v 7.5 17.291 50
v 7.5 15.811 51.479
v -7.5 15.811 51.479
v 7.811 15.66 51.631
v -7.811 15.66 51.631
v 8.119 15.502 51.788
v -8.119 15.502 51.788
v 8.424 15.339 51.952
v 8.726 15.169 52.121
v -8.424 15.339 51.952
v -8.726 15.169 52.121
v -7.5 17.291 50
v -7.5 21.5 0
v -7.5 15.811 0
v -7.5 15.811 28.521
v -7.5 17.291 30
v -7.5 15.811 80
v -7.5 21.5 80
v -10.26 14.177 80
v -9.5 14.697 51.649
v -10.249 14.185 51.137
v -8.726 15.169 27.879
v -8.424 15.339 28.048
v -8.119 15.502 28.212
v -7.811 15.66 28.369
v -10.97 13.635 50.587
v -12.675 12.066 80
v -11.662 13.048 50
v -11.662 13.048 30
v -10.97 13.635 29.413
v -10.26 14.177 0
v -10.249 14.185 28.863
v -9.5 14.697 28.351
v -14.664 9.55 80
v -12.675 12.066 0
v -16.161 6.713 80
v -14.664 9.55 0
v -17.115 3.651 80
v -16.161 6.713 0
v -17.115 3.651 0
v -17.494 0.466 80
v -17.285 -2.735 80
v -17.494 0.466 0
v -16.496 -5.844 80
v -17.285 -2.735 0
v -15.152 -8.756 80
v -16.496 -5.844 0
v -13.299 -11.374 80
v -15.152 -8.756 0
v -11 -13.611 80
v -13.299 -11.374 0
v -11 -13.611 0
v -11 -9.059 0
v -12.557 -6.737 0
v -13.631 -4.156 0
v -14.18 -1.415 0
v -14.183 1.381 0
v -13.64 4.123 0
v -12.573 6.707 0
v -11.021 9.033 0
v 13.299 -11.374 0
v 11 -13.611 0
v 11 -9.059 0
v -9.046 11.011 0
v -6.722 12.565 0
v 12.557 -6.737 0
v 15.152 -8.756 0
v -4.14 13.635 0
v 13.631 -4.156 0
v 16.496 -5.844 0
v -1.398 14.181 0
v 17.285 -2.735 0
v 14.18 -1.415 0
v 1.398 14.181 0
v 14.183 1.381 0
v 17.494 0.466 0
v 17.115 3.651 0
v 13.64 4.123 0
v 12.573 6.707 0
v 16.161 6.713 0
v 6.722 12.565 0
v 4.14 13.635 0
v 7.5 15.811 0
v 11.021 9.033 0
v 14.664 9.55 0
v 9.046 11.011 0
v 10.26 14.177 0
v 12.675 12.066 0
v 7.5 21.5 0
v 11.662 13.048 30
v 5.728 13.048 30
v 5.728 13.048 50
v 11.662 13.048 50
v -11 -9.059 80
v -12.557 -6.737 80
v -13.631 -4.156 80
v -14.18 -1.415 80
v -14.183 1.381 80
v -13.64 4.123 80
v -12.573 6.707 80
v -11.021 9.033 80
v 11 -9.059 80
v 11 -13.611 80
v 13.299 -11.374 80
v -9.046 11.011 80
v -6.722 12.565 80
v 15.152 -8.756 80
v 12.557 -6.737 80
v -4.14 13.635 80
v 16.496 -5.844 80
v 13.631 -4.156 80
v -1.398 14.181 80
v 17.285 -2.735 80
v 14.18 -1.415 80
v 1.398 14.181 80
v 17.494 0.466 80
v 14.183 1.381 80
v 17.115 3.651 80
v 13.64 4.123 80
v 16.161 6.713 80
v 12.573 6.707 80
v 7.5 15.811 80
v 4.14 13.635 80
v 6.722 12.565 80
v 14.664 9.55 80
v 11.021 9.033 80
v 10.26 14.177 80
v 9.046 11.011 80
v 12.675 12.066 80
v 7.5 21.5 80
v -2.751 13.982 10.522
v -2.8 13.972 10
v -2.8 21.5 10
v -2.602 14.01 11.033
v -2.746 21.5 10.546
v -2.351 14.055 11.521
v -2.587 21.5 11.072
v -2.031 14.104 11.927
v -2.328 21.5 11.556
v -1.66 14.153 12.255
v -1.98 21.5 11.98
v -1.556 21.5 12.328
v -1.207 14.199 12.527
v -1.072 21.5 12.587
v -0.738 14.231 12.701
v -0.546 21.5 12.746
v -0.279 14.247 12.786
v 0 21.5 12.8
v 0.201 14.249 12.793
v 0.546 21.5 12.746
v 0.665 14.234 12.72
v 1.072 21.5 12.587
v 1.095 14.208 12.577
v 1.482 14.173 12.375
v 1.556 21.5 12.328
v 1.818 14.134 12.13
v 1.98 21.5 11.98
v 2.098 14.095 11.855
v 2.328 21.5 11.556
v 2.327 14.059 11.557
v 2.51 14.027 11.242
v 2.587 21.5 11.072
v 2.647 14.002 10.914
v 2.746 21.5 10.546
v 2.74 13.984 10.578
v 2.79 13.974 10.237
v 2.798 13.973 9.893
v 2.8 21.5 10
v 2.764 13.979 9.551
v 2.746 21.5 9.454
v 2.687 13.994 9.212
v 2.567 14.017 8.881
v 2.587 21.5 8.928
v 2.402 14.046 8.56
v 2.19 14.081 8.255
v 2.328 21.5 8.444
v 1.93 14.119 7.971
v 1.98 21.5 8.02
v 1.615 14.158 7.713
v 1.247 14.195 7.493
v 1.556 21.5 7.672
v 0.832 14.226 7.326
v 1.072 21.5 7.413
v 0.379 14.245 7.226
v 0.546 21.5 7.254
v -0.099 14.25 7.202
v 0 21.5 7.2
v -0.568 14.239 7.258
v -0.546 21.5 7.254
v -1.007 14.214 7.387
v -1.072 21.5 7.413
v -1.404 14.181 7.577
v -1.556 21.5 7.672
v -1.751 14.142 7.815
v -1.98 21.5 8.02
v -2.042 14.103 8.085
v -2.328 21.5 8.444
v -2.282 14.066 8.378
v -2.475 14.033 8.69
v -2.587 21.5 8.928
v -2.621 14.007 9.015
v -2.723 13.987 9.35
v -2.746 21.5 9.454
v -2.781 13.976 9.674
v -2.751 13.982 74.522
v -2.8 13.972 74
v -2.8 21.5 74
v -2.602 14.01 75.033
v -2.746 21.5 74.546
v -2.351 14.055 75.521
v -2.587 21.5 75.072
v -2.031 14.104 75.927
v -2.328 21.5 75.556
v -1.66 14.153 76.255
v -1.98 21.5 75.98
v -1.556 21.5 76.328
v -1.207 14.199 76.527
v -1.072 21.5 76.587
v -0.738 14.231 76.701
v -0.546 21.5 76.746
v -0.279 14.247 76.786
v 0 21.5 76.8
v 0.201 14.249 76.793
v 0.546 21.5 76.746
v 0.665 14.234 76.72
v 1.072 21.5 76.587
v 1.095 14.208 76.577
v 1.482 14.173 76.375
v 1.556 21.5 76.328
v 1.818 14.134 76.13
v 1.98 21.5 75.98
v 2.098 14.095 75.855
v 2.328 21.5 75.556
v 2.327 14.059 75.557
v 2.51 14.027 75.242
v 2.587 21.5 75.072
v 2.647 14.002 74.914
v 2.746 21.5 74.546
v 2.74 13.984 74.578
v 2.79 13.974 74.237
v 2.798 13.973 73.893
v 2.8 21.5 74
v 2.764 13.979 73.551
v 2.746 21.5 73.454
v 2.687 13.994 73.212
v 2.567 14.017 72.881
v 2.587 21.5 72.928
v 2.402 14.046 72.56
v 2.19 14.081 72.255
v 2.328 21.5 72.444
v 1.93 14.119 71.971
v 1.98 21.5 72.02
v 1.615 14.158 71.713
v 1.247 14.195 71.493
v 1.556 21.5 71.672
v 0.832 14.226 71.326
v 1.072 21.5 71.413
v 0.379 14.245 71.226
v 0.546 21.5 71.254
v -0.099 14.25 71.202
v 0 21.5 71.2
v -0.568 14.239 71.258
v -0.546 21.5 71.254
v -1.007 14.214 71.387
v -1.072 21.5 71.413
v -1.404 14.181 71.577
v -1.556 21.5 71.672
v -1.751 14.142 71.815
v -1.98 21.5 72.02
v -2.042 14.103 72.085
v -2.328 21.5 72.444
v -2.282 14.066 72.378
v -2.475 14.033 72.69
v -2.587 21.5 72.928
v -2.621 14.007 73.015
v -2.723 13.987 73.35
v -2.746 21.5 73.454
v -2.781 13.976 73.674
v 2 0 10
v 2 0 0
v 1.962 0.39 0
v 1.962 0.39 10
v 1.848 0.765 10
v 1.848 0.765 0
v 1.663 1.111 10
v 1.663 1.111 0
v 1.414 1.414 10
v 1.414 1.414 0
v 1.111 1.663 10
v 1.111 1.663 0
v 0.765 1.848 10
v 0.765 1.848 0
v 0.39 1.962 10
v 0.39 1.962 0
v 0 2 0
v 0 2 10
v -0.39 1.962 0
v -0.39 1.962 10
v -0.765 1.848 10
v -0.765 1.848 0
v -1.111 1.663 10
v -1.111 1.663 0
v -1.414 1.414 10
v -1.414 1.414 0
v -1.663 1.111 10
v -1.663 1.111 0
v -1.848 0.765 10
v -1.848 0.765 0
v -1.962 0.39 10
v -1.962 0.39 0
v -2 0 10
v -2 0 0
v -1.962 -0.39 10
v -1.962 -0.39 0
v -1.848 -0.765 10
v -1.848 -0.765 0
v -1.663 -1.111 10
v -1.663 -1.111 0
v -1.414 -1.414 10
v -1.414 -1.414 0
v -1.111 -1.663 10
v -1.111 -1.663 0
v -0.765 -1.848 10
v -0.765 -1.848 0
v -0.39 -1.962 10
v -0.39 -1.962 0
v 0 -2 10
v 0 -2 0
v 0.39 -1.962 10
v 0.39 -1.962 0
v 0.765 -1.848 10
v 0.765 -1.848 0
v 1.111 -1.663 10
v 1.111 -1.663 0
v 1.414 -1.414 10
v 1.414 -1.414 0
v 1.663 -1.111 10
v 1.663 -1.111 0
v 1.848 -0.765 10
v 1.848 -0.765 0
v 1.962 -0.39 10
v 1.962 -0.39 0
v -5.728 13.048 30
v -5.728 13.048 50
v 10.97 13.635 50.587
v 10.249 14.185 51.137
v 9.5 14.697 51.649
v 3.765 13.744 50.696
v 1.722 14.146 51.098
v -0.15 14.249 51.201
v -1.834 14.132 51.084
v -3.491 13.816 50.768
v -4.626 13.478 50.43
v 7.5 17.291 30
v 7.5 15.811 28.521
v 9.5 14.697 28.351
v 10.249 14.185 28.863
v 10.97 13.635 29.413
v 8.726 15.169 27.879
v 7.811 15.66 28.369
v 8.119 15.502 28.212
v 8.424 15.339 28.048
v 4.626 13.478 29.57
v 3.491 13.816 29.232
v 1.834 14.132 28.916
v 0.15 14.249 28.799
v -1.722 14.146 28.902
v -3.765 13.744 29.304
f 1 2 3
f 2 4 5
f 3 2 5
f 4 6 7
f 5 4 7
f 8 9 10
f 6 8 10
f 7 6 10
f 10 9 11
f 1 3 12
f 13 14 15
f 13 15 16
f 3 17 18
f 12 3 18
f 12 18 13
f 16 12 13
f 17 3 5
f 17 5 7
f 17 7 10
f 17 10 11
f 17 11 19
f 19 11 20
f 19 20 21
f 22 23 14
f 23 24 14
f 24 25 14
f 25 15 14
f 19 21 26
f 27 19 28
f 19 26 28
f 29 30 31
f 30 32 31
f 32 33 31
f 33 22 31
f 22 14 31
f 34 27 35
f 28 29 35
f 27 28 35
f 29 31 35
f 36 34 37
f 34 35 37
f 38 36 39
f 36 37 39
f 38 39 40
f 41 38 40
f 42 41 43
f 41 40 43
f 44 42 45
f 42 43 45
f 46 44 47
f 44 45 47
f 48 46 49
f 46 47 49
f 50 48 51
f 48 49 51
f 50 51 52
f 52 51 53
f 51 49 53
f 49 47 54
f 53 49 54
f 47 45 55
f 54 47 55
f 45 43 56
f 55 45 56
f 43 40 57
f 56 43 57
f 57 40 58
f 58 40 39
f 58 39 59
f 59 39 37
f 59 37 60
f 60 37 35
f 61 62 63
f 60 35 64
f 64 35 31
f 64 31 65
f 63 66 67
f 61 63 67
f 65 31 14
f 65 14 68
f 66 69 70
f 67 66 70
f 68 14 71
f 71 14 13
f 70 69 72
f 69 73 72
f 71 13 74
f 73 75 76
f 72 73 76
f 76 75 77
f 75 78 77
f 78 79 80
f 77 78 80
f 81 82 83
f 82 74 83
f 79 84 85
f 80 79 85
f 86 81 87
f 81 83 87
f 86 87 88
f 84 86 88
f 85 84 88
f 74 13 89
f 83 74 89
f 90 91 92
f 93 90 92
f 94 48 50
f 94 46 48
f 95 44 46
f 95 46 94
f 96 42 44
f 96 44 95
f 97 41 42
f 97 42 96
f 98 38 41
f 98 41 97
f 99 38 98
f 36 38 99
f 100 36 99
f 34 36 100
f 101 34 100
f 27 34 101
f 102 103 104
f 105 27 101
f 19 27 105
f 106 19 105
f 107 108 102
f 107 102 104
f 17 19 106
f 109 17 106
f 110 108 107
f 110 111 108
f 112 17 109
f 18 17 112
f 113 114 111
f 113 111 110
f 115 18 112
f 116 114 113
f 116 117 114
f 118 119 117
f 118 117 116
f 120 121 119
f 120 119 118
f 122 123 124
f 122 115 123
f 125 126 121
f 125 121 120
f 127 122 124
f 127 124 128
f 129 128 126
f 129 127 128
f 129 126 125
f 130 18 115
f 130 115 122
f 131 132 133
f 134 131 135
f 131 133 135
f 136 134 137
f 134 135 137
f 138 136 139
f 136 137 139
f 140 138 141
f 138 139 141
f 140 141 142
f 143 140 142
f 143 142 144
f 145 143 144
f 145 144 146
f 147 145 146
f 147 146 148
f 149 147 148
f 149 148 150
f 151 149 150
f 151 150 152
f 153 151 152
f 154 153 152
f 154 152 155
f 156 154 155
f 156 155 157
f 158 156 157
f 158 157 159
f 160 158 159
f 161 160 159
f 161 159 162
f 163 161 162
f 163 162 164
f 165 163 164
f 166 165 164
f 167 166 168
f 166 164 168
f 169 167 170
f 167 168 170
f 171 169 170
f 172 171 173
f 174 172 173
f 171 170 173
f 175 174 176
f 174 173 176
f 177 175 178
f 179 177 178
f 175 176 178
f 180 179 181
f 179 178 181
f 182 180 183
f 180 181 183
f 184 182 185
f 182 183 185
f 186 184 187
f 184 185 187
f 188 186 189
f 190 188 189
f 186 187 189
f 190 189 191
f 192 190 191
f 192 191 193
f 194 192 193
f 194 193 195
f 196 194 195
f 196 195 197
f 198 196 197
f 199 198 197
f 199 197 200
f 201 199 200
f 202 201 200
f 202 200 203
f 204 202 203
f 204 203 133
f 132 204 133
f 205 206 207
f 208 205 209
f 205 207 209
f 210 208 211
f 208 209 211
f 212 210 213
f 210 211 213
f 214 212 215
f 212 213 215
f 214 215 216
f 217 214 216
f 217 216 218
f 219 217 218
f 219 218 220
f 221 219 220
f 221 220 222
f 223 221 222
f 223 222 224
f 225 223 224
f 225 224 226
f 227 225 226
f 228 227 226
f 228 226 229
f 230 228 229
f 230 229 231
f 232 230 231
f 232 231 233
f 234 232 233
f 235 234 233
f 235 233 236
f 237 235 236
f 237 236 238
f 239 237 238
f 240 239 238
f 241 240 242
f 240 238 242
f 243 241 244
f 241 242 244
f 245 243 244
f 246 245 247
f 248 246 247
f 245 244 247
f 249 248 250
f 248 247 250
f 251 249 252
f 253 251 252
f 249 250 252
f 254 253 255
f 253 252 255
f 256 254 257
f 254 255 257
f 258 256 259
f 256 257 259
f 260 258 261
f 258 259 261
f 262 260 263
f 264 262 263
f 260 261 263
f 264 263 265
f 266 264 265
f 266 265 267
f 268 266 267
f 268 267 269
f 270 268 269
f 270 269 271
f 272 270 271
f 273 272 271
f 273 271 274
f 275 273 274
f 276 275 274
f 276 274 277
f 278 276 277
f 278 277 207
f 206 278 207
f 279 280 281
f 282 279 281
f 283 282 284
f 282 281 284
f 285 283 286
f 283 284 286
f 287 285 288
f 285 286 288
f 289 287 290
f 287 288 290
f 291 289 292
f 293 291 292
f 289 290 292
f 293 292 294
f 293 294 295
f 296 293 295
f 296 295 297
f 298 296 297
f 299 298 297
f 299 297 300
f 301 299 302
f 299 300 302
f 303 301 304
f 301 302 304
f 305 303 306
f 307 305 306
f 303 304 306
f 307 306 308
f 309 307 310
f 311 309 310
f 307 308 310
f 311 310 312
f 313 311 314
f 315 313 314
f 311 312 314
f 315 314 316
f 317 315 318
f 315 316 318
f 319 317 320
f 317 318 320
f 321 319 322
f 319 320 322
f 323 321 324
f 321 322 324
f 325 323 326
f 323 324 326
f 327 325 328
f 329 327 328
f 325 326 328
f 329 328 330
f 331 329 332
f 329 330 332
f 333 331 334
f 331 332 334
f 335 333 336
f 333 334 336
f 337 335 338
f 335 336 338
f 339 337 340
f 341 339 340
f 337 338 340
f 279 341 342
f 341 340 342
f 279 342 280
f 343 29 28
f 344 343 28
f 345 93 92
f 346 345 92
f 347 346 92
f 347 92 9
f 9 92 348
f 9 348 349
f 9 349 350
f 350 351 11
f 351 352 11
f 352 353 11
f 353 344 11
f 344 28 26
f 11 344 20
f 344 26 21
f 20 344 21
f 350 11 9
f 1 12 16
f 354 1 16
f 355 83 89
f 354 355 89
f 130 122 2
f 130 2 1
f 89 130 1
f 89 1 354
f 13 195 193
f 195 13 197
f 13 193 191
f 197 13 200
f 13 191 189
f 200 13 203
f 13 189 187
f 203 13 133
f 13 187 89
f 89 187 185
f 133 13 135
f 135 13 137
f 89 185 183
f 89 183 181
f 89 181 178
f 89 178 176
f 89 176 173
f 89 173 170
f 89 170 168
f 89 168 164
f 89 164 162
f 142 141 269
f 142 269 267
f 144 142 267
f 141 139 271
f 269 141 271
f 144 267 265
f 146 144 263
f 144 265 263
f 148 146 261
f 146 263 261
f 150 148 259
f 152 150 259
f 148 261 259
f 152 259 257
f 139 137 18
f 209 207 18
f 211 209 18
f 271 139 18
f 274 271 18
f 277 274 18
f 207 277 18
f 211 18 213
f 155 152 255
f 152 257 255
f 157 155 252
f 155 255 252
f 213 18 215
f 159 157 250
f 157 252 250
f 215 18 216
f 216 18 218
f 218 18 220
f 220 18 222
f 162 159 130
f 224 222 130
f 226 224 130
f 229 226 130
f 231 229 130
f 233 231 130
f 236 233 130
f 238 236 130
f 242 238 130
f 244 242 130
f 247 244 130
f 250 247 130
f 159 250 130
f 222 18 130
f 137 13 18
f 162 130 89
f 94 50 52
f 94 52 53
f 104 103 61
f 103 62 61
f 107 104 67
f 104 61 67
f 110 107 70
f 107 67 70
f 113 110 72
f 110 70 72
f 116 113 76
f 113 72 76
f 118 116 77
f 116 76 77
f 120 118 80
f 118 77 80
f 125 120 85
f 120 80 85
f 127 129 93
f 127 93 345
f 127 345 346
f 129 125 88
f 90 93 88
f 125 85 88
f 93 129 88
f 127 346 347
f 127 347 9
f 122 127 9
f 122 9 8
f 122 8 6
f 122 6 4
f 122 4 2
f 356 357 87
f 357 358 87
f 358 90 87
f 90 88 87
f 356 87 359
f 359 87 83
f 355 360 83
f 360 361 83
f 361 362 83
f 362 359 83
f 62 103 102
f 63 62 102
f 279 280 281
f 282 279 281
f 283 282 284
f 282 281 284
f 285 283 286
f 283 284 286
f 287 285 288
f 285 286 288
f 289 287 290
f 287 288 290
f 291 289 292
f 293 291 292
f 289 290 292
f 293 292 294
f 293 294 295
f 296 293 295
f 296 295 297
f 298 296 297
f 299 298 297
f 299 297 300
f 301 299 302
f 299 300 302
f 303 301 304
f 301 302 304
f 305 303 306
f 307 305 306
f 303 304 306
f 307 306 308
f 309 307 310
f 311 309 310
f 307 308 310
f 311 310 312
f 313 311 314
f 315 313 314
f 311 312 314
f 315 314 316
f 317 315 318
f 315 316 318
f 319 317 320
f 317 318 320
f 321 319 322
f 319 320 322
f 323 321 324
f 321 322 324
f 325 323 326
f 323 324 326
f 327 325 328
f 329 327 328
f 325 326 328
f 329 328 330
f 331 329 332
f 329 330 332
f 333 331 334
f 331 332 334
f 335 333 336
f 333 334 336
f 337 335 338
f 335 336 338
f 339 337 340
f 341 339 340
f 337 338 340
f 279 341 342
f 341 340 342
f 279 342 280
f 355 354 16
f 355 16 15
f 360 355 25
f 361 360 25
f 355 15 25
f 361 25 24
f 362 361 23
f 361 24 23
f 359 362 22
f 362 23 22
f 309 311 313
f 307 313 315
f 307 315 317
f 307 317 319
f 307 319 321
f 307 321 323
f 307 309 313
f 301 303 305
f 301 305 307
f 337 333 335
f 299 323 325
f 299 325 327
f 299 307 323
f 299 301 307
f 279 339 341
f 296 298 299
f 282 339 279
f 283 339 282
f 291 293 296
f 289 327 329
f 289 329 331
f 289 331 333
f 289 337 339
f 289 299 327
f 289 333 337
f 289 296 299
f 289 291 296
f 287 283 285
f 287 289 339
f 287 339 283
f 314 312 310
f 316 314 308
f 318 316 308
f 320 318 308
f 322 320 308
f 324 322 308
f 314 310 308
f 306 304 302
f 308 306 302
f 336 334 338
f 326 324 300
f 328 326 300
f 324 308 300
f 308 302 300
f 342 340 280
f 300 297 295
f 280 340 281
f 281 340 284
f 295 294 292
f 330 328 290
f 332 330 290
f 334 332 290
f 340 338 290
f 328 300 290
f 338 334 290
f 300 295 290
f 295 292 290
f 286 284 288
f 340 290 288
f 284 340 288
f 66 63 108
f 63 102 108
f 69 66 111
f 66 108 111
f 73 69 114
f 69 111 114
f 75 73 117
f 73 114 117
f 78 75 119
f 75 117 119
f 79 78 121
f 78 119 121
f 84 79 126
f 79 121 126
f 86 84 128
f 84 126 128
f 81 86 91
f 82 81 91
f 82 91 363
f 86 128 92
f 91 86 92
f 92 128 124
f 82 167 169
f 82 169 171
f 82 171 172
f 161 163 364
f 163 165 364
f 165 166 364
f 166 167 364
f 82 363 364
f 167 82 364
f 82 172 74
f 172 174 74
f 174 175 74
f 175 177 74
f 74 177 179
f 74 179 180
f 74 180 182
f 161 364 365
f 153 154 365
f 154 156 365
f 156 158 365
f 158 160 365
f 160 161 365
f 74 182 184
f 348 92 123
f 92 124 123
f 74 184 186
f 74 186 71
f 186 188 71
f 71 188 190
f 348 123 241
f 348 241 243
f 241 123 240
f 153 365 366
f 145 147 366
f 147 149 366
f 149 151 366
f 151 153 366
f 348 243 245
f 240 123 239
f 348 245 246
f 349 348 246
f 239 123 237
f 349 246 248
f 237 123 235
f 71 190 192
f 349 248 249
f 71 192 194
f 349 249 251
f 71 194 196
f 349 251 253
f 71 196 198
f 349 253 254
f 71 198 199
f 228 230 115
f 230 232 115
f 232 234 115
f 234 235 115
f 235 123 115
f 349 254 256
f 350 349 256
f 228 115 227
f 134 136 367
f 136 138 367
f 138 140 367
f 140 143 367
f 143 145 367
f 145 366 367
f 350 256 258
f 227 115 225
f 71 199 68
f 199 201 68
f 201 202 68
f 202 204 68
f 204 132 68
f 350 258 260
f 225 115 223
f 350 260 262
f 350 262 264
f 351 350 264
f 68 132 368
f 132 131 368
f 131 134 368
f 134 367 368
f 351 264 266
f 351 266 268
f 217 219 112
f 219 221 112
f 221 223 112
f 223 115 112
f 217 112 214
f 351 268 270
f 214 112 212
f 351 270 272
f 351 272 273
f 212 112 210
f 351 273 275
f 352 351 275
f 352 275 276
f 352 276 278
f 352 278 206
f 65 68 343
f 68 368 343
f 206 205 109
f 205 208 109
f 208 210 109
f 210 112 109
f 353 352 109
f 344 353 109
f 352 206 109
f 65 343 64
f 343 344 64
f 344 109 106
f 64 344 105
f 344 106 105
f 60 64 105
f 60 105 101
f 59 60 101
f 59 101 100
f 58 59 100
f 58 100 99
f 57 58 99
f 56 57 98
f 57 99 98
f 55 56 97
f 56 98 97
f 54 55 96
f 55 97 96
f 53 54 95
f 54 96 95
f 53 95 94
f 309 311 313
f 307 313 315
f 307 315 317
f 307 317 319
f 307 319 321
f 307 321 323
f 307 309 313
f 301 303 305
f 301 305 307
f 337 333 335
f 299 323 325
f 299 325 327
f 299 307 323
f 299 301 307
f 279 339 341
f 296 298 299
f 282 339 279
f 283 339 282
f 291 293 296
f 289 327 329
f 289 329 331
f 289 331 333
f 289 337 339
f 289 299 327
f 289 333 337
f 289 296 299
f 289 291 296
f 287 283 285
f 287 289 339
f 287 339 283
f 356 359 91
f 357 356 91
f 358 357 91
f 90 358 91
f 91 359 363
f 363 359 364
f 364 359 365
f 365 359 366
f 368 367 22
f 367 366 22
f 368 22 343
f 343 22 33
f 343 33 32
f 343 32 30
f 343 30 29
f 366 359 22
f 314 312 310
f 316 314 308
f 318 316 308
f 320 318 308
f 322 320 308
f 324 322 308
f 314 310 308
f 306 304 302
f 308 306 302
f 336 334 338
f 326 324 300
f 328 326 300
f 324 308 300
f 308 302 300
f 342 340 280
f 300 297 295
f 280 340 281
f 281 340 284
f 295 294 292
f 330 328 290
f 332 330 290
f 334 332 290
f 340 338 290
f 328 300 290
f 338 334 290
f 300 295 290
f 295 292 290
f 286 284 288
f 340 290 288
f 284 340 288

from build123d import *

# Parameters (mm, degrees)
SKETCH_R          = 17.5
PAD_DEPTH         = 80
SKETCH001_R       = 14.25
POCKET_DEPTH      = 80.001
SKETCH002_W       = 15
SKETCH002_H       = 6
PAD001_DEPTH      = 80
SKETCH003_W       = 22
SKETCH003_H       = 25
POCKET001_DEPTH   = 80.001
SKETCH004_R       = 2.8
POCKET002_DEPTH   = 35.111658
POCKET003_DEPTH   = 25
CYLINDER_R        = 2
CYLINDER_DEPTH    = 10
CYLINDER001_R     = 2
CYLINDER001_DEPTH = 10


with BuildPart() as pocket003:
    # Sketch → Pad (new body)
    with BuildSketch(Plane.XY):
        Circle(SKETCH_R)
    extrude(amount=PAD_DEPTH)

    # Sketch001 → Pocket (cut, through all)
    with BuildSketch(Plane.XY.offset(80)):
        Circle(SKETCH001_R)
    extrude(amount=-POCKET_DEPTH, mode=Mode.SUBTRACT)

    # Sketch002 → Pad001 (new body)
    with BuildSketch(Plane.XY.offset(80)):
        with Locations((0, 18.5)):
            Rectangle(SKETCH002_W, SKETCH002_H)
    extrude(amount=-PAD001_DEPTH)

    # Sketch003 → Pocket001 (cut, through all)
    with BuildSketch(Plane.XY.offset(80)):
        with Locations((0, -12.5)):
            Rectangle(SKETCH003_W, SKETCH003_H)
    extrude(amount=-POCKET001_DEPTH, mode=Mode.SUBTRACT)

    # Sketch004 → Pocket002 (cut, through all)
    with BuildSketch(Plane(origin=(0, 21.5, 0), x_dir=(-1, 0, 0), z_dir=(0, 1, 0))):
        with Locations((0, 74)):
            Circle(SKETCH004_R)
        with Locations((0, 10)):
            Circle(SKETCH004_R)
    extrude(amount=-POCKET002_DEPTH, mode=Mode.SUBTRACT)

    # Sketch005 → Pocket003 (cut, symmetric)
    with BuildSketch(Plane(origin=(-6, 0, 0), x_dir=(0, -1, 0), z_dir=(-1, 0, 0))):
        Polygon((-15.169251, 52.121307), (-17.290584, 50), (-17.290584, 29.999974), (-15.169264, 27.878654), (-13.047943, 29.999974), (-13.047943, 49.999974), align=None)
    extrude(amount=POCKET003_DEPTH, both=True, mode=Mode.SUBTRACT)


with BuildPart() as cylinder:
    # Cylinder → Cylinder (new body)
    with BuildSketch(Plane.XY):
        Circle(CYLINDER_R)
    extrude(amount=CYLINDER_DEPTH)


with BuildPart() as cylinder001:
    # Cylinder001 → Cylinder001 (new body)
    with BuildSketch(Plane.XY):
        Circle(CYLINDER001_R)
    extrude(amount=CYLINDER001_DEPTH)


solid = Compound([pocket003.part, cylinder.part, cylinder001.part])
